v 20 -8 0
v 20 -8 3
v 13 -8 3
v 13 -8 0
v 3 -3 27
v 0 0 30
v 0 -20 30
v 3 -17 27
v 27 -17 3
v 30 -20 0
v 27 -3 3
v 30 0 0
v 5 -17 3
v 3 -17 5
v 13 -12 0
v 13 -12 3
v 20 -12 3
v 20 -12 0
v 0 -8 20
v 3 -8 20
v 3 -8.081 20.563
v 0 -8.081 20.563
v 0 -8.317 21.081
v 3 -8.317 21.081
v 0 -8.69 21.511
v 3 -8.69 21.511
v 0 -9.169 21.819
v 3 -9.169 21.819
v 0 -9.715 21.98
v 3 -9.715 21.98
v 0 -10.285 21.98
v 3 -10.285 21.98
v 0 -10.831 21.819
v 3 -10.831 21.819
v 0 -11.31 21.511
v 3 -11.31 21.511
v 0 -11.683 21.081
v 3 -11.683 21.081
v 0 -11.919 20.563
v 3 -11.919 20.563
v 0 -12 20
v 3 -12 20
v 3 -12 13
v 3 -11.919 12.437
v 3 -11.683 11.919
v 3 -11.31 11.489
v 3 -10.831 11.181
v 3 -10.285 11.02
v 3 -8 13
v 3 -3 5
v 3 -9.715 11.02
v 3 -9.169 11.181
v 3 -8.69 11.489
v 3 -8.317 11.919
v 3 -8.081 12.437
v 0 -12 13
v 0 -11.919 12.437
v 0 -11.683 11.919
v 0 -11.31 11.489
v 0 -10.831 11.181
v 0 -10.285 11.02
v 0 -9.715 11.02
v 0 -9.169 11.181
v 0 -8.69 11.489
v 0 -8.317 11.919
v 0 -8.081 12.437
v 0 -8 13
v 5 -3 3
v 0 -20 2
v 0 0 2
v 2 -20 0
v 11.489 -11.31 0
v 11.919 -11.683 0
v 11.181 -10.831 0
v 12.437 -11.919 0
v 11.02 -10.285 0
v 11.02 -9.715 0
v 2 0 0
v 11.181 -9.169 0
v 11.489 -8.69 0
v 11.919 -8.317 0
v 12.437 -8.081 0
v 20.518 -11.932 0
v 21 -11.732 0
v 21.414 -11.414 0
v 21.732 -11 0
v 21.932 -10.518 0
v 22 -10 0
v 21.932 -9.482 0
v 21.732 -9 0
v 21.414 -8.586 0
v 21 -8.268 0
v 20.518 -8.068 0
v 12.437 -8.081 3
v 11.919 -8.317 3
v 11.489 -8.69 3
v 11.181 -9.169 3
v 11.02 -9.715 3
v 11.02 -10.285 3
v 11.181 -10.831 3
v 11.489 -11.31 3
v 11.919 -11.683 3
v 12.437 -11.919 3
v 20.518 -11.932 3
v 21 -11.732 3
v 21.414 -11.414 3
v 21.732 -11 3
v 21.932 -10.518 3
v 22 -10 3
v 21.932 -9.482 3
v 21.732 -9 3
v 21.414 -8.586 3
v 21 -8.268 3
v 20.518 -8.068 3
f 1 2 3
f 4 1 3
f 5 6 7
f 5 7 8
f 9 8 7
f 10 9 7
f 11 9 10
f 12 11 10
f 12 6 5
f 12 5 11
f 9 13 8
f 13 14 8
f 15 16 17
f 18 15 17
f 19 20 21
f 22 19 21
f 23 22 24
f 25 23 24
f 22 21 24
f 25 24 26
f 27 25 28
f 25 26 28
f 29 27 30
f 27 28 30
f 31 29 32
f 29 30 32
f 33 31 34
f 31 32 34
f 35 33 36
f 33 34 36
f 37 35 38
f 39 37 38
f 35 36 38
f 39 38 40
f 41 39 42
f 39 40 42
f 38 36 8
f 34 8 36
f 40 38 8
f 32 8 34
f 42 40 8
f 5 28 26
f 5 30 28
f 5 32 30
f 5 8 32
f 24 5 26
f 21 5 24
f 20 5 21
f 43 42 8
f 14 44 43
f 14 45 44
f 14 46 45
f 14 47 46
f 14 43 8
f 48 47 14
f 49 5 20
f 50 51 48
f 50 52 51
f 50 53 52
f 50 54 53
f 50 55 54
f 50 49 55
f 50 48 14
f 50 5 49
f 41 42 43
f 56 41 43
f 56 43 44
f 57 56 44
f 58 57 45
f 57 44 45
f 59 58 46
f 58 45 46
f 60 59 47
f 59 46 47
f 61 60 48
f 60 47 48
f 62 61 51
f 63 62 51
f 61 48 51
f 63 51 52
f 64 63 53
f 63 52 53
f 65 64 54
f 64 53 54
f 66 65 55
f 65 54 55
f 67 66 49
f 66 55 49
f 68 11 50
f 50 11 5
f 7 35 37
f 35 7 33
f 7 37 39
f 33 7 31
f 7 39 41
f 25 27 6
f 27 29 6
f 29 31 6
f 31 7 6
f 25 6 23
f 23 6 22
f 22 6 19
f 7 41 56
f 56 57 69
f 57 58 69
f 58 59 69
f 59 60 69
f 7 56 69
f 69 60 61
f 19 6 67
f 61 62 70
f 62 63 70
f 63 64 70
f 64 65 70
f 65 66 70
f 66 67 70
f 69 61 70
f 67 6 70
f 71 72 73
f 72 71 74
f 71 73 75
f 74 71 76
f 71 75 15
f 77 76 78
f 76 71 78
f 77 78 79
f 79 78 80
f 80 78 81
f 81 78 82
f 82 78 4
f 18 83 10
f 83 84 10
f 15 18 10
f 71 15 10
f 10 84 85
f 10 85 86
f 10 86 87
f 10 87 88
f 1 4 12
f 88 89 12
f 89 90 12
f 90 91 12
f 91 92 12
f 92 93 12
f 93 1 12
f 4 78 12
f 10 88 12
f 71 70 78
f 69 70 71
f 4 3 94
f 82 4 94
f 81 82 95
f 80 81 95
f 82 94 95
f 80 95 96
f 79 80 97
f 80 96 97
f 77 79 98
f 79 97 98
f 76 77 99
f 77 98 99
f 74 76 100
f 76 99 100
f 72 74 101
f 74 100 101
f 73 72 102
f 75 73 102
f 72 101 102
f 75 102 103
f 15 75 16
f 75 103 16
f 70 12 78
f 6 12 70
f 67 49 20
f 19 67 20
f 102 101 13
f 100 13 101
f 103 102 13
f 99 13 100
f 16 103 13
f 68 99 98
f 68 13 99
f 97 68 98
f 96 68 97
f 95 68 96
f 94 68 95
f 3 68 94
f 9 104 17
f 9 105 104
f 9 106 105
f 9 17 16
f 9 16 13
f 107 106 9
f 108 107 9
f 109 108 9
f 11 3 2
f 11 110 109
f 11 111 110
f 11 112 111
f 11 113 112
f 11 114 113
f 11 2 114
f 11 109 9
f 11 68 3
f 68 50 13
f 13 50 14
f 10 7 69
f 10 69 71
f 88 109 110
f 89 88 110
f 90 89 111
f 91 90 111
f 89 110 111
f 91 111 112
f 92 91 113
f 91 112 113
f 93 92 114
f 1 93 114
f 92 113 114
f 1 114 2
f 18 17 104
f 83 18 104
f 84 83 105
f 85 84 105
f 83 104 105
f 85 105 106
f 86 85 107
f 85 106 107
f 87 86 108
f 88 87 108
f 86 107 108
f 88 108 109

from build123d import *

# Parameters (mm, degrees)
F1_DEPTH  = 20
F3_DEPTH  = 17
F5_DEPTH  = 3
F6_SIZE   = 2
F8_DEPTH  = 25
F9_SIZE   = 2
F11_DEPTH = 25


with BuildPart() as f1:
    # F0 (on Front) → F1 (new body)
    with BuildSketch(Plane.XZ):
        Polygon((0, 30), (0, 0), (30, 0), align=None)
    extrude(amount=F1_DEPTH)

    # F2 (on Front) → F3 (cut)
    with BuildSketch(Plane.XZ):
        Polygon((29.658684, 3), (3, 28.884496), (3, 3), align=None)
    extrude(amount=F3_DEPTH, mode=Mode.SUBTRACT)

    # F4 (on face) → F5 (join)
    with BuildSketch(Plane(origin=(0, 0, 0), x_dir=(-1, 0, 0), z_dir=(0, 1, 0))):
        Polygon((-3, 3), (-3, 27), (-27, 3), align=None)
    extrude(amount=-F5_DEPTH)

    # F6
    f6_edges = [f1.edges().sort_by_distance(p)[0] for p in [
        (0, -10, 0),
    ]]
    chamfer(f6_edges, length=F6_SIZE)

    # F7 (on face) → F8 (cut)
    with BuildSketch(Plane.YZ.offset(3)):
        with BuildLine():
            ThreePointArc((-12, 20), (-10, 18), (-8, 20))
            ThreePointArc((-8, 20), (-10, 22), (-12, 20))
        make_face()
        with BuildLine():
            Line((-8, 13), (-8, 20))
            ThreePointArc((-8, 20), (-10, 18), (-12, 20))
            Line((-12, 20), (-12, 13))
            ThreePointArc((-12, 13), (-10, 15), (-8, 13))
        make_face()
        with BuildLine():
            ThreePointArc((-12, 13), (-10, 11), (-8, 13))
            ThreePointArc((-8, 13), (-10, 15), (-12, 13))
        make_face()
    extrude(amount=-F8_DEPTH, mode=Mode.SUBTRACT)

    # F9
    f9_edges = [f1.edges().sort_by_distance(p)[0] for p in [
        (3, -10, 3),
    ]]
    chamfer(f9_edges, length=F9_SIZE)

    # F10 (on face) → F11 (cut)
    with BuildSketch(Plane.XY.offset(3)):
        with BuildLine():
            ThreePointArc((20, -12), (21.414214, -11.414214), (22, -10))
            ThreePointArc((22, -10), (21.414214, -8.585786), (20, -8))
            ThreePointArc((20, -8), (18, -10), (20, -12))
        make_face()
        with BuildLine():
            ThreePointArc((20, -12), (18, -10), (20, -8))
            Line((20, -8), (13, -8))
            ThreePointArc((13, -8), (14.414214, -8.585786), (15, -10))
            ThreePointArc((15, -10), (14.414214, -11.414214), (13, -12))
            Line((13, -12), (20, -12))
        make_face()
        with BuildLine():
            ThreePointArc((15, -10), (14.414214, -8.585786), (13, -8))
            ThreePointArc((13, -8), (11, -10), (13, -12))
            ThreePointArc((13, -12), (14.414214, -11.414214), (15, -10))
        make_face()
    extrude(amount=-F11_DEPTH, mode=Mode.SUBTRACT)


solid = f1.part
